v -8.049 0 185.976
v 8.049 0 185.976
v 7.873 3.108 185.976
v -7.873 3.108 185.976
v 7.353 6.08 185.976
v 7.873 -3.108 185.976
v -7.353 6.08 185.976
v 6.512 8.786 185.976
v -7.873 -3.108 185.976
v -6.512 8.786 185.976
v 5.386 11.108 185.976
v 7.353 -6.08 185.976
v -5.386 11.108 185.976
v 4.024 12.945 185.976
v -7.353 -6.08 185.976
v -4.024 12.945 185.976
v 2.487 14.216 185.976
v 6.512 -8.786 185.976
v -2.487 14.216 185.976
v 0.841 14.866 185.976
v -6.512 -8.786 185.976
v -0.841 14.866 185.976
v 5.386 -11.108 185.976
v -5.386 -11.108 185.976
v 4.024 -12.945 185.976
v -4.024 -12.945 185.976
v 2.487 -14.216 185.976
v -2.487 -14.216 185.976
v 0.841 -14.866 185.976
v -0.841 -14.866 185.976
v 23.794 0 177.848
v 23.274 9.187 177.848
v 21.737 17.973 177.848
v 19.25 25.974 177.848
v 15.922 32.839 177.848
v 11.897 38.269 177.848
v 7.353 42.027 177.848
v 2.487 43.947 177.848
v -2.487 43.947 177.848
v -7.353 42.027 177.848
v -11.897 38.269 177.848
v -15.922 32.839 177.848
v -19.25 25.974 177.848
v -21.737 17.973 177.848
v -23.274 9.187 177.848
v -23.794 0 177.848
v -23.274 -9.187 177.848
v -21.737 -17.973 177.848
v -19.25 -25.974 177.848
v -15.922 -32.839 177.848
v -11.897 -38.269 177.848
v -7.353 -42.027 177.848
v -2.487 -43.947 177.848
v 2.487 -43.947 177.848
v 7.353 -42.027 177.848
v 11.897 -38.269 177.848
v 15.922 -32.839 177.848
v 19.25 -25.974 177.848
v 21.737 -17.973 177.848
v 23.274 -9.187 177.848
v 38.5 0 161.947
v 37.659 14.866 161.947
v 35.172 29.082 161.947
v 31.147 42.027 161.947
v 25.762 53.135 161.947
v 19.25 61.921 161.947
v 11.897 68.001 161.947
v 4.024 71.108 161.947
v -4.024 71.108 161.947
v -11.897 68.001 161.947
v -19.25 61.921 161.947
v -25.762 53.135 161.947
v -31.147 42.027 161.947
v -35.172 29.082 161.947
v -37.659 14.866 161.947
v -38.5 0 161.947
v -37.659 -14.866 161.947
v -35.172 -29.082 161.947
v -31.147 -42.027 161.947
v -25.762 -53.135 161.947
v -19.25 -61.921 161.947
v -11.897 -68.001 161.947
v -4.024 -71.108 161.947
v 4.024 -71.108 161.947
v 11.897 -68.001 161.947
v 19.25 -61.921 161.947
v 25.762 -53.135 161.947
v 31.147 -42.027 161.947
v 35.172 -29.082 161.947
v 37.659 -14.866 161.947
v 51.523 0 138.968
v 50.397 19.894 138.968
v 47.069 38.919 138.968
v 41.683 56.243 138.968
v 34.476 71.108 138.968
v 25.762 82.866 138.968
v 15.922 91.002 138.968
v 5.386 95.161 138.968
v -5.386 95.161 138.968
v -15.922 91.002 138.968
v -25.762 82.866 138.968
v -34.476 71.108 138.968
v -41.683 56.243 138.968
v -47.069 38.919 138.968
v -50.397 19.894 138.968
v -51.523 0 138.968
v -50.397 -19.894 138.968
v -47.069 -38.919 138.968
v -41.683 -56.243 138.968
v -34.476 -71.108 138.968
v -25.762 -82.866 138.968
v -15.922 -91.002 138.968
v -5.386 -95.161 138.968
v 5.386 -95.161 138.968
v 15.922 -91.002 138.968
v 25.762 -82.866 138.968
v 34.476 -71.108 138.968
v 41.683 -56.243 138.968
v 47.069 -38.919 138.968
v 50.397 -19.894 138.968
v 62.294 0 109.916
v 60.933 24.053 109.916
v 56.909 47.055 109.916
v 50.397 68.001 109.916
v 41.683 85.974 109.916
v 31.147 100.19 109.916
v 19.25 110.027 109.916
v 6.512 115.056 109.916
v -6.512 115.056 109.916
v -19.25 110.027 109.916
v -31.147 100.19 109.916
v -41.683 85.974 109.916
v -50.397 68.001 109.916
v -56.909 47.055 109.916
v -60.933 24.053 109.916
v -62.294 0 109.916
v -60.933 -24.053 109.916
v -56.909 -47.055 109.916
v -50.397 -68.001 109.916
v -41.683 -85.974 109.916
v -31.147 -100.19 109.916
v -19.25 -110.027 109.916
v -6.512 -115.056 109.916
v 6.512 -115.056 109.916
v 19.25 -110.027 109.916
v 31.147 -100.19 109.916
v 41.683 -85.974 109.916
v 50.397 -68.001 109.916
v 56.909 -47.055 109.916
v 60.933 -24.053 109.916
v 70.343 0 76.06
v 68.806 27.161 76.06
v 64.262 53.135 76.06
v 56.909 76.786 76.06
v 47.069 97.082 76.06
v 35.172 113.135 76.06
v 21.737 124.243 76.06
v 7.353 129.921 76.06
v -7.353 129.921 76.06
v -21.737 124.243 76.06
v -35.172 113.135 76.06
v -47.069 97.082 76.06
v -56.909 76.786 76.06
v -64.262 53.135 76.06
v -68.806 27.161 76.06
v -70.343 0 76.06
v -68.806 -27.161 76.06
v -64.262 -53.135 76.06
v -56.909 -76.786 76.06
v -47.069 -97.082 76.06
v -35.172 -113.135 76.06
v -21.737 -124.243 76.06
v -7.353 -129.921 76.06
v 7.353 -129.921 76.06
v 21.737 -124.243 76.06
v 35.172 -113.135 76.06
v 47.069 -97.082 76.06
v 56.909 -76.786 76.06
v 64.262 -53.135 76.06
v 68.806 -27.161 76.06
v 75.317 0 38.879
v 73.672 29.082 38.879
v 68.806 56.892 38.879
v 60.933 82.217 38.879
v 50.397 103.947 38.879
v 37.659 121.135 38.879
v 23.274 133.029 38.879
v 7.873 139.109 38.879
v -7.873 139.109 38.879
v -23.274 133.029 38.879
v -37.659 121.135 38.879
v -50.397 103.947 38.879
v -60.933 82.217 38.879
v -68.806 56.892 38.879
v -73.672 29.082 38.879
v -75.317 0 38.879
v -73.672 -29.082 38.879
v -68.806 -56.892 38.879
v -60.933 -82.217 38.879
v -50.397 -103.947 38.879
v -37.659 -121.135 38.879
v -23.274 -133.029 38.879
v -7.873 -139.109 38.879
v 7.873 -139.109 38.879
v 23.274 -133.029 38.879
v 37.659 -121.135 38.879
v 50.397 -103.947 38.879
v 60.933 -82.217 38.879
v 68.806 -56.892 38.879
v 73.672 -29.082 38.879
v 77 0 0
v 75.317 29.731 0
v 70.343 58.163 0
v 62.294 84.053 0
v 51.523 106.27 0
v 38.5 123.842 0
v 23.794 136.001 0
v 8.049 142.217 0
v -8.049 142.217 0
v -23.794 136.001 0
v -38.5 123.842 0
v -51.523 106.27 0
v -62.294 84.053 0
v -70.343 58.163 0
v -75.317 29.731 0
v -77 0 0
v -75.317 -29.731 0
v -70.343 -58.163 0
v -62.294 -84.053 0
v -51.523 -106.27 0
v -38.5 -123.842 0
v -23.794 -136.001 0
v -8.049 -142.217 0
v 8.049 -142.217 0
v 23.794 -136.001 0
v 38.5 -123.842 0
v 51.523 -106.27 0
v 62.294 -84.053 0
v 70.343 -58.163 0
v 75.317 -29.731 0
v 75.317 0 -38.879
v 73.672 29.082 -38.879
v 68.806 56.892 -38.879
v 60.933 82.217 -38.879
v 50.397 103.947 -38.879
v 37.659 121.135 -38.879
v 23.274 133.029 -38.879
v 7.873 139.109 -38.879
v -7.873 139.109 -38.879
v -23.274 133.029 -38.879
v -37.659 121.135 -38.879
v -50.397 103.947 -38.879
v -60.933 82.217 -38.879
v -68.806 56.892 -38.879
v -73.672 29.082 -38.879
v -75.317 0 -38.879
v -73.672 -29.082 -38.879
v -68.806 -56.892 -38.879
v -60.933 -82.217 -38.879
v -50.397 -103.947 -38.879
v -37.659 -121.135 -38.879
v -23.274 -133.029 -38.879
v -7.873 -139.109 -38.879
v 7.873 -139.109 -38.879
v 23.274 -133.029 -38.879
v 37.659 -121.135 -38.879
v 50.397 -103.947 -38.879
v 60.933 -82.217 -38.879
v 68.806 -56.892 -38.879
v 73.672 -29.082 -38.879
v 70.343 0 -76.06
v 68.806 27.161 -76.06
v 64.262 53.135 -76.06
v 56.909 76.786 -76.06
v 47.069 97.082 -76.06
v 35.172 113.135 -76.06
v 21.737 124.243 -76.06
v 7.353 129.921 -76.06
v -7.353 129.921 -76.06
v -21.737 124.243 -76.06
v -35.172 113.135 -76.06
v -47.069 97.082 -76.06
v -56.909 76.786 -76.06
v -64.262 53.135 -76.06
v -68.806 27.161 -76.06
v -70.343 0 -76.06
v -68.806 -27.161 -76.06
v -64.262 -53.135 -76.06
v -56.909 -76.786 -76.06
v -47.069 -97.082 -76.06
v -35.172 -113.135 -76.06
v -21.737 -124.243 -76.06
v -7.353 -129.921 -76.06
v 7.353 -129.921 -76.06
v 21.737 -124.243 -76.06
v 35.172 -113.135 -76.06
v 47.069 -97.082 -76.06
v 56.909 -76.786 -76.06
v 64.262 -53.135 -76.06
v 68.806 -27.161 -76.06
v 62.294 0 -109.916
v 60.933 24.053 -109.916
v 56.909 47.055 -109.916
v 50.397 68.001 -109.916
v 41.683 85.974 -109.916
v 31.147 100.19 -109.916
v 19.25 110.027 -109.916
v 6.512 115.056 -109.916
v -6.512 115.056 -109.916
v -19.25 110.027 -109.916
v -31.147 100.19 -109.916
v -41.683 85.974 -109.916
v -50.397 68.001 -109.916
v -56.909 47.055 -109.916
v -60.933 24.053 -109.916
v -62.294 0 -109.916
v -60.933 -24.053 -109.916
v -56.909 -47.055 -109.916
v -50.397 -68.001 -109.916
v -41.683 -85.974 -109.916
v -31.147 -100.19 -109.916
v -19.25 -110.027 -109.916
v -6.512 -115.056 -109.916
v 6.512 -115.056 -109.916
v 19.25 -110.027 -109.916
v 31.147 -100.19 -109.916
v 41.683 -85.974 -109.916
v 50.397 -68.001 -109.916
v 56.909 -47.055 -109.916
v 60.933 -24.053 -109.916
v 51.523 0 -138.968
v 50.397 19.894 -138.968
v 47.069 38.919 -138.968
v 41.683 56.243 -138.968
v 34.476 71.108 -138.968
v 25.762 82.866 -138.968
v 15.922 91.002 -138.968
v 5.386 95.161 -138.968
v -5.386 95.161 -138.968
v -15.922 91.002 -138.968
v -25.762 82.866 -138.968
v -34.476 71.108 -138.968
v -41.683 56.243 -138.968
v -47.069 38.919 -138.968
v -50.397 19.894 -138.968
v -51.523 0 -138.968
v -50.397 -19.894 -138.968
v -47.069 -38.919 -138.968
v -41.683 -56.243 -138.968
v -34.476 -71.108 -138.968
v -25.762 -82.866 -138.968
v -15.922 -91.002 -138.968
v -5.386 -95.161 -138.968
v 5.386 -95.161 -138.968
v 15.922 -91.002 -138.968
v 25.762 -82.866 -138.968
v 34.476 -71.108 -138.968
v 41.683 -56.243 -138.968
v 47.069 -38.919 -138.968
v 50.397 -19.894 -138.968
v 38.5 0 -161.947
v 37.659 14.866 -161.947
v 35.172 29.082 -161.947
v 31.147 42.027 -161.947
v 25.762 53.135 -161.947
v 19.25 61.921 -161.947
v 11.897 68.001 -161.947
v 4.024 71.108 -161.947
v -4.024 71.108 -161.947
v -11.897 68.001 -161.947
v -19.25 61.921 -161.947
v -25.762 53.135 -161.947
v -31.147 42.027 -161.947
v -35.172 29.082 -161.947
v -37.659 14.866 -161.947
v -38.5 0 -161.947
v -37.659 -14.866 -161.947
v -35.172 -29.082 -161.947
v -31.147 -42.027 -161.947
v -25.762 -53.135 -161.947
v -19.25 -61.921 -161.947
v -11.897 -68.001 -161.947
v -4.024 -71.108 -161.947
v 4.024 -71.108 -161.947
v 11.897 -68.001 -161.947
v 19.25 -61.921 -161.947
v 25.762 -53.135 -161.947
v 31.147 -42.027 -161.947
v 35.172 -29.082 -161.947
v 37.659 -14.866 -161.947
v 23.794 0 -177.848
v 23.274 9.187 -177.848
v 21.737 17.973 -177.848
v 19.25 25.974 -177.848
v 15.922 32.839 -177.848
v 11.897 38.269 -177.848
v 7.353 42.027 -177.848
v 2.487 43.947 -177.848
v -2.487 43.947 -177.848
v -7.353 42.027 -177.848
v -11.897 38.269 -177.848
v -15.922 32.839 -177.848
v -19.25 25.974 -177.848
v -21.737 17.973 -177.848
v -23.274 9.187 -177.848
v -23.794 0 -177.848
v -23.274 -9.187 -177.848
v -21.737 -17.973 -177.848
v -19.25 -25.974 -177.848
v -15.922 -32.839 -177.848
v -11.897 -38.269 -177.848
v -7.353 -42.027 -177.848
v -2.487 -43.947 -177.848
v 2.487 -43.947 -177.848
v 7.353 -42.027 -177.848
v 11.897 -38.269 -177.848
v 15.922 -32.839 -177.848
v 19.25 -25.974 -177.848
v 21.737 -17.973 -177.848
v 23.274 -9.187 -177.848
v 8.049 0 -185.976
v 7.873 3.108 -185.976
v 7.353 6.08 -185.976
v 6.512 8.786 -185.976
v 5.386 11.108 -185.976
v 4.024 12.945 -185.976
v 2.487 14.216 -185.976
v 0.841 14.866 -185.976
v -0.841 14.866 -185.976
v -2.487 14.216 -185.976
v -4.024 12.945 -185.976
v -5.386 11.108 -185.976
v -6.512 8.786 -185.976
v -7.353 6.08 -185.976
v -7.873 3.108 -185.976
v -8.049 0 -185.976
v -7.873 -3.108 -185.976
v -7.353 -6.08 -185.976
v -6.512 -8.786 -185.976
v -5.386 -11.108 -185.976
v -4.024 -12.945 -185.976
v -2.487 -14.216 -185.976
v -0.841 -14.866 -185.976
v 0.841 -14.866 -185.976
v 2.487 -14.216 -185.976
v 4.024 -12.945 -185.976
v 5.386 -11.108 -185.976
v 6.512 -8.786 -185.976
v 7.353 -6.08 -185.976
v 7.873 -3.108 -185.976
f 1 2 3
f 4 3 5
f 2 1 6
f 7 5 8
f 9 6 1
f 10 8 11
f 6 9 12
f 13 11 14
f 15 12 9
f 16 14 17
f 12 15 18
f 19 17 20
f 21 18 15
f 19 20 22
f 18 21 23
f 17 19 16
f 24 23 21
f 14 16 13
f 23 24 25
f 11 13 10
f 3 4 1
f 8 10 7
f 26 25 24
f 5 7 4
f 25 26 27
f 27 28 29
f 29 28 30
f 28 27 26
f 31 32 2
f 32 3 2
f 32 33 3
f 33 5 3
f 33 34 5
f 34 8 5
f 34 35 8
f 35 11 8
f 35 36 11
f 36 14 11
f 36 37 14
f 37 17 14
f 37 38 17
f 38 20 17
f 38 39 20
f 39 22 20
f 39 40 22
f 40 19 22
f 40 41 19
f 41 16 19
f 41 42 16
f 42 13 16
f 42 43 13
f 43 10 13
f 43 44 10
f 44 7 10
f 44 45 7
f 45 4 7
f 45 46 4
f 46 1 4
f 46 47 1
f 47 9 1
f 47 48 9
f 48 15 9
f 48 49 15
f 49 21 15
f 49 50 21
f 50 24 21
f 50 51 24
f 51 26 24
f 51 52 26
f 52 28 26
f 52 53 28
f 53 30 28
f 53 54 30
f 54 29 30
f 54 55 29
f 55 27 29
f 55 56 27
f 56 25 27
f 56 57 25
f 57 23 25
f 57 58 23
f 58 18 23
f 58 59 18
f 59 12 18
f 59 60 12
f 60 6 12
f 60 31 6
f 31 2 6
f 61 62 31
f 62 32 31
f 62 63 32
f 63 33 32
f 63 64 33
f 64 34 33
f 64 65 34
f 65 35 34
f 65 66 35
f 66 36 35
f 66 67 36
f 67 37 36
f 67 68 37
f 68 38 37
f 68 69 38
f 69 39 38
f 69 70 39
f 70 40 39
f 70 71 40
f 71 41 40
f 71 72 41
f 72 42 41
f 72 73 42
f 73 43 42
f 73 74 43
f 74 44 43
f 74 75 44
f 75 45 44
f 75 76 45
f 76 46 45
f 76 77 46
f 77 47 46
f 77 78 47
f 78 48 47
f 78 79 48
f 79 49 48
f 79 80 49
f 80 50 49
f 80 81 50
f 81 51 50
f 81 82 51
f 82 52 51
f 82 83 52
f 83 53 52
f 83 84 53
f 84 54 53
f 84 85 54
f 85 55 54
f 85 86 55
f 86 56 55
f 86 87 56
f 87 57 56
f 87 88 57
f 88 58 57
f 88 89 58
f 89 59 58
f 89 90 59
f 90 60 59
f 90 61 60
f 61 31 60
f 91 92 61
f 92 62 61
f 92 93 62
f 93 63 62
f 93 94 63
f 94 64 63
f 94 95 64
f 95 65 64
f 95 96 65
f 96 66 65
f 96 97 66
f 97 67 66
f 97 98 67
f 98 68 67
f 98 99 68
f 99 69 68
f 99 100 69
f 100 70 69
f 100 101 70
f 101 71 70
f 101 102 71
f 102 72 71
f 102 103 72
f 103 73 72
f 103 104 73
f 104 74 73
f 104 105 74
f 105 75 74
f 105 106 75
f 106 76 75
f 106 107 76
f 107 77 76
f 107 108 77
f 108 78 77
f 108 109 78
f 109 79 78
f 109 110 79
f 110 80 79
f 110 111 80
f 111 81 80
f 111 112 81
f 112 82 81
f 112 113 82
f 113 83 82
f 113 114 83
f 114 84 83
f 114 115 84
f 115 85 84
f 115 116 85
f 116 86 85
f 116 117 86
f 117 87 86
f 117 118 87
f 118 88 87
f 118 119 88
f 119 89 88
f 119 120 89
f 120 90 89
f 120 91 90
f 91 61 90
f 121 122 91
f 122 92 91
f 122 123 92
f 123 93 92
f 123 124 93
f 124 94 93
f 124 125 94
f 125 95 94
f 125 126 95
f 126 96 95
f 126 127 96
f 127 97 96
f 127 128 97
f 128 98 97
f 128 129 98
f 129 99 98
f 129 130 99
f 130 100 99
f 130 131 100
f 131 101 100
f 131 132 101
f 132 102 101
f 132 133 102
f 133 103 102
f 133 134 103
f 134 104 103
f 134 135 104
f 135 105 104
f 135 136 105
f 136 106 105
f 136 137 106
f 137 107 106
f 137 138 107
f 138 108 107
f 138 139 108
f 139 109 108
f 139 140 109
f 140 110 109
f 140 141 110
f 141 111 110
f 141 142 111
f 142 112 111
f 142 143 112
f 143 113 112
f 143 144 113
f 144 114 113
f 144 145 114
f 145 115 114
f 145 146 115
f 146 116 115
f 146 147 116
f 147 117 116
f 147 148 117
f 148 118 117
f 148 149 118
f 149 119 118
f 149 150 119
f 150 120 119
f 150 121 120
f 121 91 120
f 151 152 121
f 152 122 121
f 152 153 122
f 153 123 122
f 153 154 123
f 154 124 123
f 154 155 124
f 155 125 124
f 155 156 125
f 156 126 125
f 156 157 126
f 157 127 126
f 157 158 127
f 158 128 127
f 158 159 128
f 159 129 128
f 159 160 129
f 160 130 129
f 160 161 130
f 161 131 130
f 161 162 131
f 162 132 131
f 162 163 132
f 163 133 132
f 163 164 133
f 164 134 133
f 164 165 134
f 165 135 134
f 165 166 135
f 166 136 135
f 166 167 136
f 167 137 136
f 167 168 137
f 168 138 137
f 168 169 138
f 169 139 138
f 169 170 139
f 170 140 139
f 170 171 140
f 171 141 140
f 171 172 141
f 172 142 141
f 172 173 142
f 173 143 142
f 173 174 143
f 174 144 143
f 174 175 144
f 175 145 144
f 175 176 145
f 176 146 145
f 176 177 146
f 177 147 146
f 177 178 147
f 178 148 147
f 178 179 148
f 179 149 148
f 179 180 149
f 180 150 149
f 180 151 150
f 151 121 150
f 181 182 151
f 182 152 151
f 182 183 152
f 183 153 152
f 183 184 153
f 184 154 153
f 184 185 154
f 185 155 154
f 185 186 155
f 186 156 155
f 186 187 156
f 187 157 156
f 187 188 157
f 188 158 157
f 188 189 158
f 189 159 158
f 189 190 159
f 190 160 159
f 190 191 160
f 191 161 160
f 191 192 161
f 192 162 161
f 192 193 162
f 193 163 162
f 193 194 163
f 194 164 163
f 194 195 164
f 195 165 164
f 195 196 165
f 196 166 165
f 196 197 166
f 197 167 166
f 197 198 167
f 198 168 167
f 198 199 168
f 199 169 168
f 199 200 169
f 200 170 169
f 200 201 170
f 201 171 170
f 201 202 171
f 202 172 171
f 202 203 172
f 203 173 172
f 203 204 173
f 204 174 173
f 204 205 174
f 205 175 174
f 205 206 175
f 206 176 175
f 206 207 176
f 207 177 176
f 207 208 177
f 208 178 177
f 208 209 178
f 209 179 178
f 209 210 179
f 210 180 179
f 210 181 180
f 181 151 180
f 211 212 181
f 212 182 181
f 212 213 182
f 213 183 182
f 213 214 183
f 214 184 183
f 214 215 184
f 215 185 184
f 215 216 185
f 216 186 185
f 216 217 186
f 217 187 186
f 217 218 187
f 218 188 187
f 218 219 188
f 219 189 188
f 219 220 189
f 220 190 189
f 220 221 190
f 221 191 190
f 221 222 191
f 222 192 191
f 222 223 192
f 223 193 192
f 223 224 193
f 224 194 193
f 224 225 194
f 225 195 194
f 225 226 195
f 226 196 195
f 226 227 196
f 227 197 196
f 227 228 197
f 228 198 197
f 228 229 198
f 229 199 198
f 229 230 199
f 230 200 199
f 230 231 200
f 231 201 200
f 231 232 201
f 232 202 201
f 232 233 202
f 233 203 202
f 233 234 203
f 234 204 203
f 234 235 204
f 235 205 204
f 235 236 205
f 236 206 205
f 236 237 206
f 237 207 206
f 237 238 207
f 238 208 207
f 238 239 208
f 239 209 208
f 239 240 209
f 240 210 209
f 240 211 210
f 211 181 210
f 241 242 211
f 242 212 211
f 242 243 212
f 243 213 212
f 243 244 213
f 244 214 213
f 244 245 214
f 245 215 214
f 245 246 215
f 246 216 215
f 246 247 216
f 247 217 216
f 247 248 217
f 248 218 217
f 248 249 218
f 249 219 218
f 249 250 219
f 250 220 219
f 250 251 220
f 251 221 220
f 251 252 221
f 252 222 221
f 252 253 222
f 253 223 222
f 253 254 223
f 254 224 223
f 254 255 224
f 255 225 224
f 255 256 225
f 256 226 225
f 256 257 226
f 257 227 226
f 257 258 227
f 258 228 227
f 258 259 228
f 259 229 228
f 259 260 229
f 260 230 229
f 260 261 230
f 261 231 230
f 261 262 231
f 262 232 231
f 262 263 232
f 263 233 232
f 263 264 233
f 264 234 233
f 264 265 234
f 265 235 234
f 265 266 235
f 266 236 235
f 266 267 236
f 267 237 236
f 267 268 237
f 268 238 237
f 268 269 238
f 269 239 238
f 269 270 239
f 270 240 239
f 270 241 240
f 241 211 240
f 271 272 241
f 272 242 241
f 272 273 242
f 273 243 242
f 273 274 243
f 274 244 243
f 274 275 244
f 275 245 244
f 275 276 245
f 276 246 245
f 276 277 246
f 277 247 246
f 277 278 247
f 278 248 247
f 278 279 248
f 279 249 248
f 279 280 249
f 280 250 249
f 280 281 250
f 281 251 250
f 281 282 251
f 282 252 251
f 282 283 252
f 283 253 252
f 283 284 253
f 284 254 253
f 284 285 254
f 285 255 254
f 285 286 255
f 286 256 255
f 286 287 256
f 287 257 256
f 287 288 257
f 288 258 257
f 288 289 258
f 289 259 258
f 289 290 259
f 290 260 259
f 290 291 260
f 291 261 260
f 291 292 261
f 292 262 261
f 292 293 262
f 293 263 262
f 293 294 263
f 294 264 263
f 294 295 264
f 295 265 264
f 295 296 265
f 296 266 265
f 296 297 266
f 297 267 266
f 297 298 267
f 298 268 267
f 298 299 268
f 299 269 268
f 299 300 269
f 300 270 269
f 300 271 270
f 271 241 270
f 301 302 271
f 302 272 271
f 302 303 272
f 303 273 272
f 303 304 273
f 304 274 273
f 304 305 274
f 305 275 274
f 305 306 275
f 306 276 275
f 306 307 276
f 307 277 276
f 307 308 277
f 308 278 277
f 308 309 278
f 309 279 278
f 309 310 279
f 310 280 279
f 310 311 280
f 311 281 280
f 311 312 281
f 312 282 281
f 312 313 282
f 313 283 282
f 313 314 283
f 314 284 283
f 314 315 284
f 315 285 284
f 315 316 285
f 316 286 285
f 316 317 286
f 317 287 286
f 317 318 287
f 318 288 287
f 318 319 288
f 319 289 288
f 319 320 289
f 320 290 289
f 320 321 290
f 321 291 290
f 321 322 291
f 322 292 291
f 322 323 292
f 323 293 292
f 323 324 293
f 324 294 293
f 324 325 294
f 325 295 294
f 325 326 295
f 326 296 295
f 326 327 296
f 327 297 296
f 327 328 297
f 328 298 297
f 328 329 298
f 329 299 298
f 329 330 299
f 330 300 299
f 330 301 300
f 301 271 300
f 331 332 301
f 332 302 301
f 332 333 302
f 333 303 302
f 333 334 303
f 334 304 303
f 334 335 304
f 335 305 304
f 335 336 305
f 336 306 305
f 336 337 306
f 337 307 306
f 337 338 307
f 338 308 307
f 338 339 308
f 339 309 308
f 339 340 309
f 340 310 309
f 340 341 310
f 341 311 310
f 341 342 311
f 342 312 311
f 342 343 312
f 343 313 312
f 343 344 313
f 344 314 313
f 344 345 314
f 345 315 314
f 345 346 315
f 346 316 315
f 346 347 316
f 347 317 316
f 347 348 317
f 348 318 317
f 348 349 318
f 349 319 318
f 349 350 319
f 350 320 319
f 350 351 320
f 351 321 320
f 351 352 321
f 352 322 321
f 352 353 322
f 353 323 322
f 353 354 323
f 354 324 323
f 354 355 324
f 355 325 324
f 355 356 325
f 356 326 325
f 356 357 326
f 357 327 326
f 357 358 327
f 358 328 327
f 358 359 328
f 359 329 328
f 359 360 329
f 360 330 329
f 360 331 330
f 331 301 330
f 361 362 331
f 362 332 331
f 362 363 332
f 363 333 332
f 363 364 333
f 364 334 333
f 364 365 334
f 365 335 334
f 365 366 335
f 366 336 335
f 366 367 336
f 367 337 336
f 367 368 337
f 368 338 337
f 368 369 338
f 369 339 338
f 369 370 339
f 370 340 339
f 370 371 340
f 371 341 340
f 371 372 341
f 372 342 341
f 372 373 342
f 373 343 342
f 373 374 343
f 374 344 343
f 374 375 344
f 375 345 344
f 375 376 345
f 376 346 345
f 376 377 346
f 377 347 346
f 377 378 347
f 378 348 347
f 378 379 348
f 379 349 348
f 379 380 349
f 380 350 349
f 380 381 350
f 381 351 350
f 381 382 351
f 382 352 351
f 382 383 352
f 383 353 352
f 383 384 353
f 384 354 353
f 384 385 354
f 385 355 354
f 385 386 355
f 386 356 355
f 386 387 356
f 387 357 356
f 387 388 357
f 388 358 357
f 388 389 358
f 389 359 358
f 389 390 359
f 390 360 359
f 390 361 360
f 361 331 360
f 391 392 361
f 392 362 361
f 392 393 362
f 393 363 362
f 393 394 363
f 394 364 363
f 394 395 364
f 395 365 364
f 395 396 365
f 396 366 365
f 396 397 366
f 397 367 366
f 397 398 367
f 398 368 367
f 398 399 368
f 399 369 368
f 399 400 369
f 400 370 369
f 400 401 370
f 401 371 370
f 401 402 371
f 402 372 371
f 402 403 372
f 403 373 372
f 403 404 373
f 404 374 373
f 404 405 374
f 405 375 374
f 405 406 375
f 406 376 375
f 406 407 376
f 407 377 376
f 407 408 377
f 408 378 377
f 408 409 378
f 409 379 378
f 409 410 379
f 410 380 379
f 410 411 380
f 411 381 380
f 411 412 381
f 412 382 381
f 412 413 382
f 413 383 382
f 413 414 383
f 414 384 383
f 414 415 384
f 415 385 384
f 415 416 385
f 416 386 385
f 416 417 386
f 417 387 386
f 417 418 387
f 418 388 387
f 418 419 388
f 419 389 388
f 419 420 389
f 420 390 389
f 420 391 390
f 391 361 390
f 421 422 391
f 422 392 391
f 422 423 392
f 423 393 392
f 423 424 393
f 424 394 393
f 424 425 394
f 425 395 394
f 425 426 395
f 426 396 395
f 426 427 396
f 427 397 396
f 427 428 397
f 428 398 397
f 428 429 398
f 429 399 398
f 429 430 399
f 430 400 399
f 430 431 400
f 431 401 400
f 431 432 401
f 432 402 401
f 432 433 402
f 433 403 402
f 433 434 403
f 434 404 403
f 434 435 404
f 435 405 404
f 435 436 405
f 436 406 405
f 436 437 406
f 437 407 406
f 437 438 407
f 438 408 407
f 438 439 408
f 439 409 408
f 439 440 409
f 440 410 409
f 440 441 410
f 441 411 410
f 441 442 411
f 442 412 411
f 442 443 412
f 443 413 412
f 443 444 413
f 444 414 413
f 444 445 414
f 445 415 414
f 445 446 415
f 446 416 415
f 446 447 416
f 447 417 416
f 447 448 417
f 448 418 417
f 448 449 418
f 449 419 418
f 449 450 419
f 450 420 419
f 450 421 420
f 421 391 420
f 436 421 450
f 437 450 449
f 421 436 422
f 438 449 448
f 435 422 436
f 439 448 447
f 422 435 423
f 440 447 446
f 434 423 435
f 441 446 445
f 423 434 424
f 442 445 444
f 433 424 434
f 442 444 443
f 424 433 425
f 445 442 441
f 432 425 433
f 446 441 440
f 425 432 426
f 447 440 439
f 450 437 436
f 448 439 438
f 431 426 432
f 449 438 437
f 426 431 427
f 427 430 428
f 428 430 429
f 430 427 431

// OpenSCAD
// Generated by SolidPython 1.0.1 on 2020-07-29 00:46:47


scale(v = [7, 13, 17]) {
	sphere(r = 11);
}
/***********************************************
*********      SolidPython code:      **********
************************************************
 
# import packages: SolidPython
from solid import *
from solid.utils import *
from itertools import chain, combinations, permutations


class Resize:

    def __init__(self, scad_file):
        self.scad_file = scad_file
        #self.scad_file = import_scad(scad_file)
        # cone/cylinder param:
        self.r1 = 0
        self.r2 = 0
        self.h = 0
        # rectangular prism param:
        self.w = 0
        self.l = 0
        # ellipse param:
        self.r = 0

    # import OpenScad code (file name corresponds to shape)


    # classify shape + parameters
    def assign(self, param1, param2, param3):
        if self.scad_file == 'cone.scad':
            self.r1 = param1
            self.r2 = param2
            self.h = param3
        elif self.scad_file == 'cylinder.scad':
            self.r1 = param1
            self.r2 = param2
            self.h = param3
        elif self.scad_file == 'rectangularPrism.scad':
            self.h = param1
            self.l = param2
            self.w = param3
        else:
            self.r = param1
            self.h = param2

    # resize parameters
    def iterate(self):
        x = range(3, 20, 2)
        i = 1
        if self.scad_file == 'cone.scad':
            tempList = list(permutations(x, 2))
            for temp in tempList:
                param1 = temp[0]
                param2 = temp[1]
                filepath = 'produced_scad_files/' + 'cone' + str(param1) + '_' + str(param2) + '_' + '.scad'
                scad_render_to_file(cylinder(h=param1, r1=param2, r2=0), filepath)

        elif self.scad_file == 'cylinder.scad':
            tempList = list(permutations(x, 3))
            for temp in tempList:
                param1 = temp[0]
                param2 = temp[1]
                filepath = 'produced_scad_files/' + 'cylinder' + str(param1) + '_' + str(param2) + '_' + '.scad'
                scad_render_to_file(cylinder(h=param1, r1=param2, r2=param2), filepath)

        elif self.scad_file == 'rectangularPrism.scad':
            tempList = list(permutations(x, 3))
            for temp in tempList:
                param1 = temp[0]
                param2 = temp[1]
                param3 = temp[2]
                filepath = 'produced_scad_files/' + 'rectangularPrism' + str(param1) + '_' + str(param2) + '_' + str(
                    param3) + '.scad'
                scad_render_to_file(cube(size=(param1, param2, param3)), filepath)

        elif self.scad_file == 'ellipse.scad':
            tempList = list(permutations(x, 4))
            for temp in tempList:
                param1 = temp[0]
                param2 = temp[1]
                param3 = temp[2]
                param4 = temp[3]
                filepath = 'produced_scad_files/' + 'ellipse' + str(param1) + '_' + str(param2) + '_' + str(param3) + '_' + str(param4) + '.scad'
                scad_render_to_file(scale([param1, param2, param3])(sphere(r=param4)), filepath)

    def render_to_scadfile(self):
        scad_render_to_file(scad, 'example.scad') 
 
************************************************/
